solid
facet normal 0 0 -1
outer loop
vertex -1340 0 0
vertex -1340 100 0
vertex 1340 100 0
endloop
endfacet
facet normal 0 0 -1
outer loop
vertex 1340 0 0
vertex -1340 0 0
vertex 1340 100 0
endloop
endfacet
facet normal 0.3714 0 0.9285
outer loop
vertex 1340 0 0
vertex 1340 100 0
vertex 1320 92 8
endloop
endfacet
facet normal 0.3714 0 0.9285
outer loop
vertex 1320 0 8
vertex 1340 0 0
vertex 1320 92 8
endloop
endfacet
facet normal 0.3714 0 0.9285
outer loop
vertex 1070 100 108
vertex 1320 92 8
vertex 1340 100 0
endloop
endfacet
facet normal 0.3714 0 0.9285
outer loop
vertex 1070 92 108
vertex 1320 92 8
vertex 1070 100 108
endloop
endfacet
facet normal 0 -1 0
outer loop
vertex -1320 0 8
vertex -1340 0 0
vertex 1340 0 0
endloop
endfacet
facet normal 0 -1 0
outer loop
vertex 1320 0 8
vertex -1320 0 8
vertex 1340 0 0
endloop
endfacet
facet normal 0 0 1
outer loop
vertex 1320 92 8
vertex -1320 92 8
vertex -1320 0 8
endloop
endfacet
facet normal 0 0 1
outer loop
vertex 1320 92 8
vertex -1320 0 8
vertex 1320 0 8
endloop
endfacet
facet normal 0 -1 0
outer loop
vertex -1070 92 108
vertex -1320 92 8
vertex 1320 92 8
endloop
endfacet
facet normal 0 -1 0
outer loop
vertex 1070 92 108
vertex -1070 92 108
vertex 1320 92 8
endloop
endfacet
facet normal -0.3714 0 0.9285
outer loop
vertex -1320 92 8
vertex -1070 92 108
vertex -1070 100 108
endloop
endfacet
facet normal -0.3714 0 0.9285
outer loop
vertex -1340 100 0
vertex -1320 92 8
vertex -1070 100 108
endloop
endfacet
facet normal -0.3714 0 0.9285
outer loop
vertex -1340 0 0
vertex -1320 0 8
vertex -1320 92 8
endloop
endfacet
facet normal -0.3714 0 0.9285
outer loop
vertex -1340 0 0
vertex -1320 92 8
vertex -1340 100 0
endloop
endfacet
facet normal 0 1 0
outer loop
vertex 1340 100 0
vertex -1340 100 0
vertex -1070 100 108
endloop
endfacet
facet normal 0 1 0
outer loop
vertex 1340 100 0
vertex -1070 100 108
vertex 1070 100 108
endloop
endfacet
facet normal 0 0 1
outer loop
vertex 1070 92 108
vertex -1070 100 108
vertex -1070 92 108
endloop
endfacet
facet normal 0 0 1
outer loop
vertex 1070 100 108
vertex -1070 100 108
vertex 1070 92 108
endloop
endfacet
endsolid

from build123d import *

# Parameters (mm, degrees)
SKETCH_1_W          = 2680
SKETCH_1_H          = 100
EXTRUDE_465_DEPTH   = 8
SKETCH_2_W          = 2680
SKETCH_2_H          = 8
EXTRUDE_1_DEPTH     = 100
CUT_EXTRUDE_1_DEPTH = 100


# Read off the part's stored shape, not the designer's step: 切除-拉伸1
with BuildPart() as part:
    # 草图1 → Extrude 465 (new body)
    with BuildSketch(Plane.XY):
        with Locations((0, 50)):
            Rectangle(SKETCH_1_W, SKETCH_1_H)
    extrude(amount=EXTRUDE_465_DEPTH)

    # 草图2 → 凸台-拉伸1 (add)
    with BuildSketch(Plane.XY.offset(8)):
        with Locations((0, 96)):
            Rectangle(SKETCH_2_W, SKETCH_2_H)
    extrude(amount=EXTRUDE_1_DEPTH)

    # 切除-拉伸1 outline → 切除-拉伸1 (cut)
    with BuildSketch(Plane(origin=(0, 0, 0), x_dir=(1, 0, 0), z_dir=(0, 1, 0))):
        Polygon((1340, -108), (1340, 0), (1070, -108), align=None)
        Polygon((-1340, -108), (-1070, -108), (-1340, 0), align=None)
    extrude(amount=CUT_EXTRUDE_1_DEPTH, mode=Mode.SUBTRACT)


solid = part.part
